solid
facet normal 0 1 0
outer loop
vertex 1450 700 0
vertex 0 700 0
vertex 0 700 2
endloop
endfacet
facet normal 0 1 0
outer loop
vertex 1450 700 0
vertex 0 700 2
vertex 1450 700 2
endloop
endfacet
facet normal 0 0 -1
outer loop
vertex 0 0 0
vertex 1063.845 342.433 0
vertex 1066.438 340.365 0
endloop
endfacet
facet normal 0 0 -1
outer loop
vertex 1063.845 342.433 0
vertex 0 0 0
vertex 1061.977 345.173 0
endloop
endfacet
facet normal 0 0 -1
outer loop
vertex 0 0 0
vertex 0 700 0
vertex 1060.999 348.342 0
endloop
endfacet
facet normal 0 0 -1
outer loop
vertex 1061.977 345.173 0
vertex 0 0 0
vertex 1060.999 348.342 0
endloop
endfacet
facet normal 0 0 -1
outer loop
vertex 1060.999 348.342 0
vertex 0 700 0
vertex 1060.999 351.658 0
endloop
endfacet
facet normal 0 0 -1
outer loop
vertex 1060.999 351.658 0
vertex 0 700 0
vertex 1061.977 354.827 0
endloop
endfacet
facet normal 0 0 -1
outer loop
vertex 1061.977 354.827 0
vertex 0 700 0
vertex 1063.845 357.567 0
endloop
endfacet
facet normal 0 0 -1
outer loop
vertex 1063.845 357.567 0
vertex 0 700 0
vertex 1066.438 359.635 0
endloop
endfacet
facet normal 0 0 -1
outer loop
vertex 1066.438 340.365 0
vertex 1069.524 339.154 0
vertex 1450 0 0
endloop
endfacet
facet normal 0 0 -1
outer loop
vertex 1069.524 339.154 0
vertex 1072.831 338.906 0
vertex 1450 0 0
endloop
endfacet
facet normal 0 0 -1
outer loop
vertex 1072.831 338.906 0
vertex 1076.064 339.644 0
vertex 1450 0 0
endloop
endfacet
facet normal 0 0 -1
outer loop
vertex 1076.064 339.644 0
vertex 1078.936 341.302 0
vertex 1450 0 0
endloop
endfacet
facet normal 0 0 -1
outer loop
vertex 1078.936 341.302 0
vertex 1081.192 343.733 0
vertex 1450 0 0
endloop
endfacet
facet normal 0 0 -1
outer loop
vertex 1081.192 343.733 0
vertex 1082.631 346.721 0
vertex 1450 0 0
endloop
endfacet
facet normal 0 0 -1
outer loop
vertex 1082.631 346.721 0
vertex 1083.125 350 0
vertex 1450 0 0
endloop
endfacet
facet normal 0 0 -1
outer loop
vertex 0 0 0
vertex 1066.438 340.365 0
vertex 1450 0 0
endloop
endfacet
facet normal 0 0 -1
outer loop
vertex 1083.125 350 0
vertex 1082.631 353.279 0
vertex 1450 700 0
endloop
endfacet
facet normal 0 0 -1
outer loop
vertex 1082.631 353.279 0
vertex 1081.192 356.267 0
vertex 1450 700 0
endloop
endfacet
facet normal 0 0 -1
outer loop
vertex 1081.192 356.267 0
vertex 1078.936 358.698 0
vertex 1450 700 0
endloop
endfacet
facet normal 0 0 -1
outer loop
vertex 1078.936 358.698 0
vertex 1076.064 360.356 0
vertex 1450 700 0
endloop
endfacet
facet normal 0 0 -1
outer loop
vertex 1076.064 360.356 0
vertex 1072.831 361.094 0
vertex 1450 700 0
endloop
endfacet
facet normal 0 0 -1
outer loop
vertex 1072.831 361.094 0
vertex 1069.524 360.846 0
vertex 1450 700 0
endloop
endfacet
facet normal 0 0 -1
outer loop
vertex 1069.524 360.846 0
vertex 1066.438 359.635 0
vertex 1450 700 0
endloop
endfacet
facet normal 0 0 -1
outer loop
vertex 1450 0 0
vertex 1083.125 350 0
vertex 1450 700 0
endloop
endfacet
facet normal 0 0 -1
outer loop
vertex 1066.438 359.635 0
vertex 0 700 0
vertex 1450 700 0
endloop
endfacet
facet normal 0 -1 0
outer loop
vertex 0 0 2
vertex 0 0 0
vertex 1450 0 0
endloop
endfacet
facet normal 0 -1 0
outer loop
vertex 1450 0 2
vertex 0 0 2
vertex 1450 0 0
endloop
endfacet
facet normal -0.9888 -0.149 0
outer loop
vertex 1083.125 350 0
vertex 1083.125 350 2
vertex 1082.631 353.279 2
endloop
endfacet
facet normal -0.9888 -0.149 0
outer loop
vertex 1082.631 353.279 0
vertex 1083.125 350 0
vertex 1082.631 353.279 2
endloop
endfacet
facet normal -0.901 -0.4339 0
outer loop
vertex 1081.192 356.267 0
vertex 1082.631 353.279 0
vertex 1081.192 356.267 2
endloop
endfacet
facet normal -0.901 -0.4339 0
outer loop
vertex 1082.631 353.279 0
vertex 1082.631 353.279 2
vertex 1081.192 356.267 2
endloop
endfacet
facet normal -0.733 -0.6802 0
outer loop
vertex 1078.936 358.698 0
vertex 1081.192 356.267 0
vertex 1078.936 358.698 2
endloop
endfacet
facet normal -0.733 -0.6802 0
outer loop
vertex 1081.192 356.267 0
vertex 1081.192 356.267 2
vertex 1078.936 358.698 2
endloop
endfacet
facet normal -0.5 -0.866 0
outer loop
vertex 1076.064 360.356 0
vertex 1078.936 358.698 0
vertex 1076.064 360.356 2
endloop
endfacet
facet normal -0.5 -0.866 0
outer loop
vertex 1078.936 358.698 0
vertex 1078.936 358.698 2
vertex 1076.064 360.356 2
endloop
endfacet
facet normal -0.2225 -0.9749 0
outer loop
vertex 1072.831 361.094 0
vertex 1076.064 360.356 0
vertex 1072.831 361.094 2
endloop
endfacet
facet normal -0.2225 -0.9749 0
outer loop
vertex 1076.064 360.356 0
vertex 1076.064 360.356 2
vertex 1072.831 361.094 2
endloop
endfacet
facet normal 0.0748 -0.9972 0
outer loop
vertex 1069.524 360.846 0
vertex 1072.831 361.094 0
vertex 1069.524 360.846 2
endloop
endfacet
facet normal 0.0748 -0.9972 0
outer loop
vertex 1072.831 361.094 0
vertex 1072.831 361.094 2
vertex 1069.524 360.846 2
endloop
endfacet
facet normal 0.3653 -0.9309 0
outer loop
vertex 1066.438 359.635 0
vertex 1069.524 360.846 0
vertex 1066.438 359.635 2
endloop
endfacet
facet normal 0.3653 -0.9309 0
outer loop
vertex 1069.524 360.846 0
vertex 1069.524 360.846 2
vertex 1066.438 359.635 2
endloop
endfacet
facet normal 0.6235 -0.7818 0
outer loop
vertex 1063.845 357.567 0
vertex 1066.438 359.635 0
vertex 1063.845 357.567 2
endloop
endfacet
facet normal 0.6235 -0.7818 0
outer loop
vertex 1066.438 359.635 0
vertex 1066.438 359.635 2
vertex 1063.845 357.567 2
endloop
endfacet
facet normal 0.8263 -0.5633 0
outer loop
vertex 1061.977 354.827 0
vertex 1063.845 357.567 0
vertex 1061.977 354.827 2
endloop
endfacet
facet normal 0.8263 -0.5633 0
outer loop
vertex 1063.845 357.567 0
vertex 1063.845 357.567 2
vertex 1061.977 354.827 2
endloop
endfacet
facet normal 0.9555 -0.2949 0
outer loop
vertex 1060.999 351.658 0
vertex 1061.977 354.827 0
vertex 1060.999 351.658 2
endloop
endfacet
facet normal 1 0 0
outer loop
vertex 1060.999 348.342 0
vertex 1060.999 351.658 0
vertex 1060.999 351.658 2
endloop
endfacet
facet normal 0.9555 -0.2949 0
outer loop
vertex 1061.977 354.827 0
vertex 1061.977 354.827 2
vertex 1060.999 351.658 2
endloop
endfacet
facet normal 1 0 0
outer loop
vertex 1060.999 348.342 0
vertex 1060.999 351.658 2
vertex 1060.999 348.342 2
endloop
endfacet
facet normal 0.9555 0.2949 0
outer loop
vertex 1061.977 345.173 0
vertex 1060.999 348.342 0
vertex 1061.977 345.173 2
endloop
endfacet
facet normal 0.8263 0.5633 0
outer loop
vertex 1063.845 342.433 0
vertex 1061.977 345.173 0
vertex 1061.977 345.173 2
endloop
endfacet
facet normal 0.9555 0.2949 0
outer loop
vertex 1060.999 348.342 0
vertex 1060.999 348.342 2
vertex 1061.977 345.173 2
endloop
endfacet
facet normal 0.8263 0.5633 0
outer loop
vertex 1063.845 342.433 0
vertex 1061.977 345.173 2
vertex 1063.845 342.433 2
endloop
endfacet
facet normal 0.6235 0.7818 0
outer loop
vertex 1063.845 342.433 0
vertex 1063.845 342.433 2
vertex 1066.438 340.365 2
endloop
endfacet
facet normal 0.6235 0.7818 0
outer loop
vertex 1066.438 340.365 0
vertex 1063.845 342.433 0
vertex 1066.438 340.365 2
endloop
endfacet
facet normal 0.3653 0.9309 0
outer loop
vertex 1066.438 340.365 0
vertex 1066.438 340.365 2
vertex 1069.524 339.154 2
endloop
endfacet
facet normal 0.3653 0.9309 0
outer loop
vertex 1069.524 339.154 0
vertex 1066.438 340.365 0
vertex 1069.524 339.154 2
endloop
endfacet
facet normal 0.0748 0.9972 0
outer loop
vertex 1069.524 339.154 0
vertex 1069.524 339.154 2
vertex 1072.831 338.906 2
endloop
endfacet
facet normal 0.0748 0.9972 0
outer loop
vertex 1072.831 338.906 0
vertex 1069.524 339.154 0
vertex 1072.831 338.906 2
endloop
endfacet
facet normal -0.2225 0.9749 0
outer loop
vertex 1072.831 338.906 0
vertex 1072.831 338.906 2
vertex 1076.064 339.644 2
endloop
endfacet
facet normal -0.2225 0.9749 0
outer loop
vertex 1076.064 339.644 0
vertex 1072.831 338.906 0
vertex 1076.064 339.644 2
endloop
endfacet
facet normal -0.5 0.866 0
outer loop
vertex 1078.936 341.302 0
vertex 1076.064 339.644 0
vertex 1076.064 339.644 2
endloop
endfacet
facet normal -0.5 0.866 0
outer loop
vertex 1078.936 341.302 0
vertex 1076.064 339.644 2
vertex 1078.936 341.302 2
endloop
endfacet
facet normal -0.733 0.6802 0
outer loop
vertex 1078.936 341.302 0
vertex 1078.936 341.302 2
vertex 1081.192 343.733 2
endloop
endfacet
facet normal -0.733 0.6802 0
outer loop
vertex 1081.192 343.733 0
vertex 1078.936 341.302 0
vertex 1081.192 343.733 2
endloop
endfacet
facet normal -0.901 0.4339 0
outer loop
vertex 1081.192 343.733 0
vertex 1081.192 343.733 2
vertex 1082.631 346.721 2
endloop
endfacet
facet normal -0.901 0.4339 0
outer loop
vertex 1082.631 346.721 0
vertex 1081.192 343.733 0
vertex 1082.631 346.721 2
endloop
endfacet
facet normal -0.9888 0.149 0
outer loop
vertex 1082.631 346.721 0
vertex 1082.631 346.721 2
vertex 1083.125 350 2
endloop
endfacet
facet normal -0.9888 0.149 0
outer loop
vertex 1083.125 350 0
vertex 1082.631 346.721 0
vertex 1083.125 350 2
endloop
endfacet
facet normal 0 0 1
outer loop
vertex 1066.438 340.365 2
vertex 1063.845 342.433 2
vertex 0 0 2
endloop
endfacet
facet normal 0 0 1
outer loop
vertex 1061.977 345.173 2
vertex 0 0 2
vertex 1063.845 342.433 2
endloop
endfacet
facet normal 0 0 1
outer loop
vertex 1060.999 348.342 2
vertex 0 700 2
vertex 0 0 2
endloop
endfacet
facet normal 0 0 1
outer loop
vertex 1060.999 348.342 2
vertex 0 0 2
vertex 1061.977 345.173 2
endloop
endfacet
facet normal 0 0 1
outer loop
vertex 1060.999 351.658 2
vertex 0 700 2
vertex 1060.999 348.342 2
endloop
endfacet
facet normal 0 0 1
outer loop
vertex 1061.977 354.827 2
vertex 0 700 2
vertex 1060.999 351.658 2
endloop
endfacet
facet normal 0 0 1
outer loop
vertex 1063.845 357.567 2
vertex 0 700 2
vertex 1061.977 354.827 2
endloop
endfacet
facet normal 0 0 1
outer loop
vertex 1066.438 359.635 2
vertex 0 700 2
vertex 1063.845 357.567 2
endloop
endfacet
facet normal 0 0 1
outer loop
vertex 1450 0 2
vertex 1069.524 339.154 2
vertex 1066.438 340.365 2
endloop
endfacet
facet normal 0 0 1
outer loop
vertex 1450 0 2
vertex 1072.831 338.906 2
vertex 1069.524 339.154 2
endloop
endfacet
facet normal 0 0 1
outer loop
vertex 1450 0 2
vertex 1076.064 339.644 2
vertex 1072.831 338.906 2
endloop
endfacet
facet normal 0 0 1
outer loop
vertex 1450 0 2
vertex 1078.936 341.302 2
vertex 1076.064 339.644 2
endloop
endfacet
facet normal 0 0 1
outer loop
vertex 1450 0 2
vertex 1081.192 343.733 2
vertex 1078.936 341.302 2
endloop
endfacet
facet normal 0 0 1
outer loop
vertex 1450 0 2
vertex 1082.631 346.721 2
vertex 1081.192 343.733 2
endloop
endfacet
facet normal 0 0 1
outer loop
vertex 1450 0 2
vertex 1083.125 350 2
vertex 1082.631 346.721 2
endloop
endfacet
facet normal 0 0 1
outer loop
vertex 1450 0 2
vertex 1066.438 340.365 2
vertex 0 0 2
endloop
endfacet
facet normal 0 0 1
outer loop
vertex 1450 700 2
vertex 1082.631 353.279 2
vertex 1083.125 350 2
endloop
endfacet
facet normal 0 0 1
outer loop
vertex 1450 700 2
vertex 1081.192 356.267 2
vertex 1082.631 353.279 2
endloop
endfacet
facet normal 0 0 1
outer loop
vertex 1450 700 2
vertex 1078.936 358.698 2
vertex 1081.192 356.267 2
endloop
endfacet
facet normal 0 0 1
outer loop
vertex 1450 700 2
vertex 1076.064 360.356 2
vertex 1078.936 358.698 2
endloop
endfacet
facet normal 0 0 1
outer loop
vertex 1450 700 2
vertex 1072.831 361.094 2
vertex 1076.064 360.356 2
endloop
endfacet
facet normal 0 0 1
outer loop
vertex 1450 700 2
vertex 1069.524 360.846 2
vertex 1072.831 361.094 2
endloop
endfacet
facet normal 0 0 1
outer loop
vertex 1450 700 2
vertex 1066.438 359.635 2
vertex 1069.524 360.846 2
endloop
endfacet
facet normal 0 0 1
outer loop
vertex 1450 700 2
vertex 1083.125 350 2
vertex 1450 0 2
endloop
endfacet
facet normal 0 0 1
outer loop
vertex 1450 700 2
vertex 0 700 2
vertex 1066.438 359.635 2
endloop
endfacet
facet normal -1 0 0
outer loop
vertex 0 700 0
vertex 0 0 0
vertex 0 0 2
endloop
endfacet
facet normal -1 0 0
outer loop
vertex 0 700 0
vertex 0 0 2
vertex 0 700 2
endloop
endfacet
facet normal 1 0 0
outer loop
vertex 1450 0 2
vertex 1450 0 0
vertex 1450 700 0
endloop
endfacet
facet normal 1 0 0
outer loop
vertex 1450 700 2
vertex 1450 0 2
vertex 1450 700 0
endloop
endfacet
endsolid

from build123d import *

# Parameters (mm, degrees)
F0_W           = 1450
F0_H           = 700
F1_DEPTH       = 2
F3_D           = 15.5
F3_DEPTH       = 14
F3_CBORE_D     = 22.25
F3_CBORE_DEPTH = 14
F3_TIP         = 4.6566697975


with BuildPart() as f1:
    # F0 (on Top) → F1 (new body)
    with BuildSketch(Plane.XY):
        with Locations((725, 350)):
            Rectangle(F0_W, F0_H)
    extrude(amount=F1_DEPTH)

    # F3
    with Locations(Plane.XY.offset(2)):
        with Locations((1072, 350)):
            CounterBoreHole(F3_D / 2, F3_CBORE_D / 2, F3_CBORE_DEPTH, depth=F3_DEPTH)
            with Locations((0, 0, -(F3_DEPTH + F3_TIP / 2))):  # 118° drill point
                Cone(0, F3_D / 2, F3_TIP, mode=Mode.SUBTRACT)


solid = f1.part
